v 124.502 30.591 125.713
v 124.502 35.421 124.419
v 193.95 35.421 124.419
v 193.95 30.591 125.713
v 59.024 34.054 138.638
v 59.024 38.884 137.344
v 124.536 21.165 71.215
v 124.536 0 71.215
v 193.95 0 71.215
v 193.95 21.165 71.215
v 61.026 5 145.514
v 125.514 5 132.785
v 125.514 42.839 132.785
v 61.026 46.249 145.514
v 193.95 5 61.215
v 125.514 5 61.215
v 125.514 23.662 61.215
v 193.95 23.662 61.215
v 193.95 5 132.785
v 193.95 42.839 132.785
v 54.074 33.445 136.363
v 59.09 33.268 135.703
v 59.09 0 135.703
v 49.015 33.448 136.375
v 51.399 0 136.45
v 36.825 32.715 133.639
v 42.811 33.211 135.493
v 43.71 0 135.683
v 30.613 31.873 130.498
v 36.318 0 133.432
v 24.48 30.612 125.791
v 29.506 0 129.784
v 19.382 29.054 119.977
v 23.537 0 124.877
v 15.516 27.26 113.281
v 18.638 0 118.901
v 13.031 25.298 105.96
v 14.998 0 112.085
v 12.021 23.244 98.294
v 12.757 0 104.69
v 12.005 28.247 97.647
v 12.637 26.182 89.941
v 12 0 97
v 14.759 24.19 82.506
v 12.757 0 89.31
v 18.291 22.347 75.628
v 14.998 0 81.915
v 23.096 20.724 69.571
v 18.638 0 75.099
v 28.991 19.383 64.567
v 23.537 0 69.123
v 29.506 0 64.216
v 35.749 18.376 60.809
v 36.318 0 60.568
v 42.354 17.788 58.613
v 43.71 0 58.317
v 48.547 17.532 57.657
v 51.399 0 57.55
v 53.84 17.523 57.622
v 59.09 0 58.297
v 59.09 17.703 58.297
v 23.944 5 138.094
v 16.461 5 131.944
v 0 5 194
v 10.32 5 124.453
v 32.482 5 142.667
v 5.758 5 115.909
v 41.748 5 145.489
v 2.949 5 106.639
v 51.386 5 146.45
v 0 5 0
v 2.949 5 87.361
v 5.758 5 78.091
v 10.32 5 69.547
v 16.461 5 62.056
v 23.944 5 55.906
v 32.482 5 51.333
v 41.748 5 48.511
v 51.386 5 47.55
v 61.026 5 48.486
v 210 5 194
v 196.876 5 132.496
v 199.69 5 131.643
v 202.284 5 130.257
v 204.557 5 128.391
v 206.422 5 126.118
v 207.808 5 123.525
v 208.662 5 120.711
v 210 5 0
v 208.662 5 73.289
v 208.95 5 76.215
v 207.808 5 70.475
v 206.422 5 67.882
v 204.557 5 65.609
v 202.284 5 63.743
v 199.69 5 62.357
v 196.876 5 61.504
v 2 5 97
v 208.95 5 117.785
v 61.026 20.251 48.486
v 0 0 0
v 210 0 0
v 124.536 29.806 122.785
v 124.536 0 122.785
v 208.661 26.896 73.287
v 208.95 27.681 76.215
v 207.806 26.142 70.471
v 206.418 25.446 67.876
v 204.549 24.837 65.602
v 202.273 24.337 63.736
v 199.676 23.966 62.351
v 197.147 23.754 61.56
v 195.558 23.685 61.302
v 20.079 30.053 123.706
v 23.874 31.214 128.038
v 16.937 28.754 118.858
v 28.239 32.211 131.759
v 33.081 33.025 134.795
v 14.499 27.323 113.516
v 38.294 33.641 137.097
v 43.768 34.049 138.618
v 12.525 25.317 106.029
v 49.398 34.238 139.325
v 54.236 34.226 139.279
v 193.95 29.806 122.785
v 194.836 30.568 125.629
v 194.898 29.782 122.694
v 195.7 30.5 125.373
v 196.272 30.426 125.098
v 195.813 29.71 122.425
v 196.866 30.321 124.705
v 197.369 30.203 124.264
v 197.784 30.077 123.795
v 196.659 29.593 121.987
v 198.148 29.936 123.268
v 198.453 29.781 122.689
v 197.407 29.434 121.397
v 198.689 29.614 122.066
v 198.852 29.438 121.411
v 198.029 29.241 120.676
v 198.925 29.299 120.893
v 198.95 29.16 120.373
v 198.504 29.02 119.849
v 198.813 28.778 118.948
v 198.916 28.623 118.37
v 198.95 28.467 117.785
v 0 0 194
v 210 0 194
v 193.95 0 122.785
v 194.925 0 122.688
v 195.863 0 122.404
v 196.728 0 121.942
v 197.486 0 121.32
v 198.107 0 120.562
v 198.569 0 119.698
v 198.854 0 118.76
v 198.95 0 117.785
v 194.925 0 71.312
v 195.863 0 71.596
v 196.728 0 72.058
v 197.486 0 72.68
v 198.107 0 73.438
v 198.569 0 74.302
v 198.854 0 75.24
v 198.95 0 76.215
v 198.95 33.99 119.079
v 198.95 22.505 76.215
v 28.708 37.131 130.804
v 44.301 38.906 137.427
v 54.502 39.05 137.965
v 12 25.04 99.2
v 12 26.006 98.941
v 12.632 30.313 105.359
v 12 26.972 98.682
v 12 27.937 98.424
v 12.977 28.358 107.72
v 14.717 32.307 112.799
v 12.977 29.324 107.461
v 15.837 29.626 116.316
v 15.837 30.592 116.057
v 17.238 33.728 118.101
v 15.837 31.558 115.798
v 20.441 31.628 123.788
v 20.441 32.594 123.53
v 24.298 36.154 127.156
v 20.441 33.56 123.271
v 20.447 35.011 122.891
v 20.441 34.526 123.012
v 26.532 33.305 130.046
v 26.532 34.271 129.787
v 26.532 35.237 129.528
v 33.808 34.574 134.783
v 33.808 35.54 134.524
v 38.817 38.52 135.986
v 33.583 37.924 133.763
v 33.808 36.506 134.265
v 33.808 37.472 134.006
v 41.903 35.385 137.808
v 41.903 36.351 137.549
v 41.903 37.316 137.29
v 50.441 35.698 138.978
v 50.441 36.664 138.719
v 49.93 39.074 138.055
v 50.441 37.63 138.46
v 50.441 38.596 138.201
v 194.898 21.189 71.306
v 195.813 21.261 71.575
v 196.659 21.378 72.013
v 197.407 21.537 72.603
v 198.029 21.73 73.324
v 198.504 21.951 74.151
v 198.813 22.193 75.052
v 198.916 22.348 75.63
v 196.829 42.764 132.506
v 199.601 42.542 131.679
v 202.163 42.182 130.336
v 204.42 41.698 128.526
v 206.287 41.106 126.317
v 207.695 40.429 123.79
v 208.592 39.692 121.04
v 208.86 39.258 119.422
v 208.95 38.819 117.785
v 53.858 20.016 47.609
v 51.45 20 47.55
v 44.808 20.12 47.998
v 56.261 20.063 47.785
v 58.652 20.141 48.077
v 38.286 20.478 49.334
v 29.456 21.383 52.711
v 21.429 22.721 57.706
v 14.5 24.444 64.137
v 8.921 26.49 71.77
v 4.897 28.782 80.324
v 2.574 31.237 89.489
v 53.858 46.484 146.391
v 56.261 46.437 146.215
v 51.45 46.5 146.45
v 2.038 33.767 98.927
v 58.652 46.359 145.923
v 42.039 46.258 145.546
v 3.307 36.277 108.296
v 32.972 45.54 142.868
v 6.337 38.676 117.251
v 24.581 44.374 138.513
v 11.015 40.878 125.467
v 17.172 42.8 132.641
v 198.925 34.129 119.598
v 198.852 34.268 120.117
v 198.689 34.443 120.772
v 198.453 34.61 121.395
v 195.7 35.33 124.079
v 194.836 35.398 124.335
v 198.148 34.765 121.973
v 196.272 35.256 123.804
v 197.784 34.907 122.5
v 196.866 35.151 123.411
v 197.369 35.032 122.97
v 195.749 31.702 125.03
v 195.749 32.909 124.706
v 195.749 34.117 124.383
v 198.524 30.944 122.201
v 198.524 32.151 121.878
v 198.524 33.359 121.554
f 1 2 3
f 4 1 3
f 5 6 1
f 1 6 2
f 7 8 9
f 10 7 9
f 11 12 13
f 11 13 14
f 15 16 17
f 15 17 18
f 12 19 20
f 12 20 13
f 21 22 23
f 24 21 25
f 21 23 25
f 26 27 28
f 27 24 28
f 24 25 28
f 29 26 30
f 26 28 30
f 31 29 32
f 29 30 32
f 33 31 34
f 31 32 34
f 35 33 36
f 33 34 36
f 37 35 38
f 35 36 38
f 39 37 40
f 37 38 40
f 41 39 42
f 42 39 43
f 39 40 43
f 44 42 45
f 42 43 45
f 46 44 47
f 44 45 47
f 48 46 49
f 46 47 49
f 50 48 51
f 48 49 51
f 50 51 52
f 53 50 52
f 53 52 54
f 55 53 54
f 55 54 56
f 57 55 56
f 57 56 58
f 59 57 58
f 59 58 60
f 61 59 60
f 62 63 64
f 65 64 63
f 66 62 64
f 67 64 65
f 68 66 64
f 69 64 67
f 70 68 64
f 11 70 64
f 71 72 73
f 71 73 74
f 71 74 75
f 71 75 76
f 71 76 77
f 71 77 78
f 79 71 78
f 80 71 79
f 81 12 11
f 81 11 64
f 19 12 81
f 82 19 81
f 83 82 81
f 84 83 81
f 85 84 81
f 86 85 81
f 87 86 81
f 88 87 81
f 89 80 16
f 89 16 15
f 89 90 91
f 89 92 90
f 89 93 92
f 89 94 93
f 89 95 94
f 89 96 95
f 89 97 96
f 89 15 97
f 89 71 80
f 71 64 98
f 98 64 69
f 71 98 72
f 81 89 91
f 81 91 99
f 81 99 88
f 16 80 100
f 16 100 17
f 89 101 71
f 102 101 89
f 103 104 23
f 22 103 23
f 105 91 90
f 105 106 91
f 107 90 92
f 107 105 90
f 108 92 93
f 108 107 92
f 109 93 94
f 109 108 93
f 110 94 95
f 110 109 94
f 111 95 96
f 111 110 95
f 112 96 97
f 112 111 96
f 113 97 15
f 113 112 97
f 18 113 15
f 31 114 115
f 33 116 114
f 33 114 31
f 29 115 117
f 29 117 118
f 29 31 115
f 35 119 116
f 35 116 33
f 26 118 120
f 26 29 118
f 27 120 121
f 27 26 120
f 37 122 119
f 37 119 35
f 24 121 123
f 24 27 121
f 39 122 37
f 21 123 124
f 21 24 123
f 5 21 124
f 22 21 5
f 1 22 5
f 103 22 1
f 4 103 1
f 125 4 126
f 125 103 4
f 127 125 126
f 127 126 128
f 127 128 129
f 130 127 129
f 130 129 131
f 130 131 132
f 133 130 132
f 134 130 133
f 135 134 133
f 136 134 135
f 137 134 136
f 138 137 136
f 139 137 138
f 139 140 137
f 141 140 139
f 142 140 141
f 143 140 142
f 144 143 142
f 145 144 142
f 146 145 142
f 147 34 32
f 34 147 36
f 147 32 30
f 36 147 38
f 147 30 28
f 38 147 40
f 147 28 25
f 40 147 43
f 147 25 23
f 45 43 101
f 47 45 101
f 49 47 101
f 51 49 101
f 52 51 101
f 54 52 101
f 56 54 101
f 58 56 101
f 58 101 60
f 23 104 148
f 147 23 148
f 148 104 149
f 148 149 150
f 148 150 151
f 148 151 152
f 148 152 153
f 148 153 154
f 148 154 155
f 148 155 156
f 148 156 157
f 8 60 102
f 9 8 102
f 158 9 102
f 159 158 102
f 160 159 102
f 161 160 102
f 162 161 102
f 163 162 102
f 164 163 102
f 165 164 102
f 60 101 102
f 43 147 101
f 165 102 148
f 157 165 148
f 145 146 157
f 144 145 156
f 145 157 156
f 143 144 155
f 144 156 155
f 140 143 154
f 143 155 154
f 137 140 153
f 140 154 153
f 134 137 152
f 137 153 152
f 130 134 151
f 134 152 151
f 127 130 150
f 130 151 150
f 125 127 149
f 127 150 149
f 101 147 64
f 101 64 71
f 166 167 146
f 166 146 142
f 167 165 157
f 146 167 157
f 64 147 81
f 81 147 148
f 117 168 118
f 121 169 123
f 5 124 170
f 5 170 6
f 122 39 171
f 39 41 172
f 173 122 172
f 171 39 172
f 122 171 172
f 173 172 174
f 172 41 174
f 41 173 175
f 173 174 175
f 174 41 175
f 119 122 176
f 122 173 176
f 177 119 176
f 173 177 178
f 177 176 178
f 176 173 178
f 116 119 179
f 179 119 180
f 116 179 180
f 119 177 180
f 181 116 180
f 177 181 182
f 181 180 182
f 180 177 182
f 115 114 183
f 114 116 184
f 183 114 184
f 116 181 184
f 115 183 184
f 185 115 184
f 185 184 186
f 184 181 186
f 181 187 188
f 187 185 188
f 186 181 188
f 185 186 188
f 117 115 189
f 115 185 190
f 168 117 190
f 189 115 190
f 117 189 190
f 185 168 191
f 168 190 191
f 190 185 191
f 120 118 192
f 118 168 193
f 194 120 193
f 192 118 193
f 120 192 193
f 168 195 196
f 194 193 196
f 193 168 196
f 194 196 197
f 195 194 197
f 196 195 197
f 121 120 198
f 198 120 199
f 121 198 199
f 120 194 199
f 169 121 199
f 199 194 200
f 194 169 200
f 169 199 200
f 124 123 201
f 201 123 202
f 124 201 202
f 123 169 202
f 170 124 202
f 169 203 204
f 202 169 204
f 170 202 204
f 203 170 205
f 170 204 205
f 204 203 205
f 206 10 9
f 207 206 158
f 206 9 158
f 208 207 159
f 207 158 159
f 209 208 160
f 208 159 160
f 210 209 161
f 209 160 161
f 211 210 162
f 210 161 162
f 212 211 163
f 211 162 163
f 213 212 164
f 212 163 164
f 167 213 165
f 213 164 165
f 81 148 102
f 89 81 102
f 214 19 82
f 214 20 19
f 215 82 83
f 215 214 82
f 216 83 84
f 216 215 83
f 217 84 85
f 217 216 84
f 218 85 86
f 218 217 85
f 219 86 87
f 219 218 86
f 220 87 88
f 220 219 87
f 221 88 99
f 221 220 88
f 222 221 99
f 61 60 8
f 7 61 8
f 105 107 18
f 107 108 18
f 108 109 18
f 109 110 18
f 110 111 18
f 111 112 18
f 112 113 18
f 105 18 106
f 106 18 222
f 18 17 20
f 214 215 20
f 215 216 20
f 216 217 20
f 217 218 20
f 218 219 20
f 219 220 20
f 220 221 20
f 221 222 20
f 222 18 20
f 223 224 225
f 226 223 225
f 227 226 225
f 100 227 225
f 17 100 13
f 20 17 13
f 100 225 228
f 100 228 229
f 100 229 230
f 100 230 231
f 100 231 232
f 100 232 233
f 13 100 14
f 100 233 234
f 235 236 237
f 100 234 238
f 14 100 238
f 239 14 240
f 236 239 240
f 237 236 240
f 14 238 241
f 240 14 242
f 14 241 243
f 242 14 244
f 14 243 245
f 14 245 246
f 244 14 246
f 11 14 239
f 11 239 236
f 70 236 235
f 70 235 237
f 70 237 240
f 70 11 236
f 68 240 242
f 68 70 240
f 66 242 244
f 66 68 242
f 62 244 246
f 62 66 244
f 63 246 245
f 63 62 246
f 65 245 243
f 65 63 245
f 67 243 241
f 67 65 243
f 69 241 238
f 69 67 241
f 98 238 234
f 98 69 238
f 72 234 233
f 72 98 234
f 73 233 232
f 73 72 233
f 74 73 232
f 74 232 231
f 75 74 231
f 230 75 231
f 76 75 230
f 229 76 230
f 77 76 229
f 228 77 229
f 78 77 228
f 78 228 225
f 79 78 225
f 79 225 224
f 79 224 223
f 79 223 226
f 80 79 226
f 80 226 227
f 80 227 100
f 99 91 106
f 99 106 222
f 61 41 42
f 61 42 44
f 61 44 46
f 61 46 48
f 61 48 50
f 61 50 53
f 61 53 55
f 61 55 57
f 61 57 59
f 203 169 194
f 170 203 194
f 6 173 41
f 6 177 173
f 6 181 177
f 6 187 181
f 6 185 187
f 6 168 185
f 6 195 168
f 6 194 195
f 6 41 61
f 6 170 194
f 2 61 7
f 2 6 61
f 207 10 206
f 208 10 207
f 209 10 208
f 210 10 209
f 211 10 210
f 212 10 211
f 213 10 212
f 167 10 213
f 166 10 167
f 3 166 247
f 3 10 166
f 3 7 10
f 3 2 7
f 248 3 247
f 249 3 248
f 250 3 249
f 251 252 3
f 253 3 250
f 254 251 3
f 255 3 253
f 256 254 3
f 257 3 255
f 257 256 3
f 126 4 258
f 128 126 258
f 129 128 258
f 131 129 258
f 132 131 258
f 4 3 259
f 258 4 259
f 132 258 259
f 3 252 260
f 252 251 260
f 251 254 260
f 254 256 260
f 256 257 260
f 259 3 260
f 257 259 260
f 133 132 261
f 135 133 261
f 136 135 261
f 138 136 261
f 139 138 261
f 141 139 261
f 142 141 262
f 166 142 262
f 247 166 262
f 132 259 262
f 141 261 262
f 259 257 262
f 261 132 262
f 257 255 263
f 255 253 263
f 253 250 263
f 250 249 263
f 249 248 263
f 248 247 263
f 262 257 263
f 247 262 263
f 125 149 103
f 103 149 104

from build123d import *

# Parameters (mm, degrees)
SKETCH_1_W          = 210
SKETCH_1_H          = 194
EXTRUDE_1_DEPTH     = 5
EXTRUDE_2_DEPTH     = 50
CUT_EXTRUDE_1_DEPTH = 292.137424595
FILLET_1_R          = 15
CUT_EXTRUDE_2_DEPTH = 15
CUT_EXTRUDE_4_DEPTH = 5
CUT_EXTRUDE_6_REACH = 289.625


with BuildPart() as part:
    # 草图1 → 凸台-拉伸1 (new body)
    with BuildSketch(Plane(origin=(0, 0, 0), x_dir=(1, 0, 0), z_dir=(0, 1, 0))):
        with Locations((105, -97)):
            Rectangle(SKETCH_1_W, SKETCH_1_H)
    extrude(amount=EXTRUDE_1_DEPTH)

    # 草图2 → 凸台-拉伸2 (add)
    with BuildSketch(Plane(origin=(0, 5, 0), x_dir=(1, 0, 0), z_dir=(0, 1, 0))):
        with BuildLine():
            Line((125.513628731, -61.215495335), (208.95, -61.215495335))
            Line((208.95, -61.215495335), (208.95, -132.784504665))
            Line((208.95, -132.784504665), (125.513628731, -132.784504665))
            Line((125.513628731, -132.784504665), (61.026324627, -145.513879526))
            ThreePointArc((61.026324627, -145.513879526), (2, -97), (61.026324627, -48.486120474))
            Line((61.026324627, -48.486120474), (125.513628731, -61.215495335))
        make_face()
    extrude(amount=EXTRUDE_2_DEPTH)

    # 草图3 → 切除-拉伸1 (cut, through all)
    with BuildSketch(Plane.ZY):
        Polygon((146.45, 46.500175131), (146.45, 55), (47.55, 55), (47.55, 20), align=None)
    extrude(amount=-CUT_EXTRUDE_1_DEPTH, mode=Mode.SUBTRACT)

    # 圆角1
    fillet_1_edges = [part.edges().sort_by_distance(p)[0] for p in [
        (208.95, 14.33082922, 61.215495335),
        (208.95, 23.919258346, 132.784504665),
    ]]
    fillet(fillet_1_edges, radius=FILLET_1_R)

    # 草图5 → 切除-拉伸2 (cut)
    with BuildSketch(Plane.XZ):
        with BuildLine():
            Line((124.536092452, 122.784504665), (59.089757463, 135.703185992))
            ThreePointArc((59.089757463, 135.703185992), (12, 97), (59.089757463, 58.296814008))
            Line((59.089757463, 58.296814008), (124.536092452, 71.215495335))
            Line((124.536092452, 71.215495335), (193.95, 71.215495335))
            ThreePointArc((193.95, 71.215495335), (197.485533906, 72.679961429), (198.95, 76.215495335))
            Line((198.95, 76.215495335), (198.95, 117.784504665))
            ThreePointArc((198.95, 117.784504665), (197.485533906, 121.320038571), (193.95, 122.784504665))
            Line((193.95, 122.784504665), (124.536092452, 122.784504665))
        make_face()
    extrude(amount=-CUT_EXTRUDE_2_DEPTH, mode=Mode.SUBTRACT)

    # 草图7 → 切除-拉伸4 (cut)
    with BuildSketch(Plane(origin=(0, 1.943124906, -0.520658749), x_dir=(1, 0, 0), z_dir=(0, 0.9659258262890681, -0.25881904510252174))):
        with BuildLine():
            Line((124.502295526, -129.347406371), (193.95, -129.347406371))
            add(Edge.make_bspline(
                [(193.95, -129.347406371), (194.562427767, -129.347406371), (195.774611757, -129.102068407), (197.439735395, -127.969946536), (198.650781168, -126.127504684), (198.95, -124.574413564), (198.95, -123.818263665)],
                knots=[-3.141592654, -3.141592654, -3.141592654, -3.141592654, -2.748893572, -2.35619449, -1.963495408, -1.570796327, -1.570796327, -1.570796327, -1.570796327], degree=3))
            Line((198.95, -123.818263665), (198.95, -80.782858462))
            add(Edge.make_bspline(
                [(198.95, -80.782858462), (198.95, -80.026708563), (198.650781168, -78.473617443), (197.439735395, -76.631175591), (195.774611757, -75.49905372), (194.562427767, -75.253715756), (193.95, -75.253715756)],
                knots=[-1.570796327, -1.570796327, -1.570796327, -1.570796327, -1.178097245, -0.785398163, -0.392699082, 0, 0, 0, 0], degree=3))
            Line((193.95, -75.253715756), (124.502295526, -75.253715756))
            Line((124.502295526, -75.253715756), (59.024136493, -61.872809237))
            add(Edge.make_bspline(
                [(59.024136493, -61.872809237), (56.210095744, -61.297740897), (50.427971911, -60.789688878), (38.964091843, -62.413259275), (25.731264842, -69.297623809), (14.654919531, -83.972220417), (10.672540234, -102.300561063), (14.654919531, -120.628901709), (25.731264842, -135.303498318), (38.964091843, -142.187862851), (50.427971911, -143.811433248), (56.210095744, -143.30338123), (59.024136493, -142.72831289)],
                knots=[-0.194888061, -0.194888061, -0.194888061, -0.194888061, 0.025822487, 0.246533036, 0.687954133, 1.12937523, 1.570796327, 2.012217424, 2.453638521, 2.895059618, 3.115770166, 3.336480715, 3.336480715, 3.336480715, 3.336480715], degree=3))
            Line((59.024136493, -142.72831289), (124.502295526, -129.347406371))
        make_face()
    extrude(amount=-CUT_EXTRUDE_4_DEPTH, mode=Mode.SUBTRACT)

    # 切除-拉伸6: up to this face of the body (flat: up to its plane)
    cut_extrude_6_end = Plane(part.part.faces().sort_by_distance((100.607454563, 28.420458434, 98.294095226))[0])
    # 草图8 → 切除-拉伸6 (cut, up to the picked face)
    with BuildSketch(Plane.XZ.offset(-15), mode=Mode.PRIVATE) as cut_extrude_6_sk1:
        with BuildLine():
            Line((193.95, 122.784504665), (124.536092452, 122.784504665))
            Line((124.536092452, 122.784504665), (59.089757463, 135.703185992))
            ThreePointArc((59.089757463, 135.703185992), (12, 97), (59.089757463, 58.296814008))
            Line((59.089757463, 58.296814008), (124.536092452, 71.215495335))
            Line((124.536092452, 71.215495335), (193.95, 71.215495335))
            ThreePointArc((193.95, 71.215495335), (197.485533906, 72.679961429), (198.95, 76.215495335))
            Line((198.95, 76.215495335), (198.95, 117.784504665))
            ThreePointArc((198.95, 117.784504665), (197.485533906, 121.320038571), (193.95, 122.784504665))
        make_face()
    cut_extrude_6_tool1 = split(extrude(cut_extrude_6_sk1.sketch, amount=-CUT_EXTRUDE_6_REACH, mode=Mode.PRIVATE), bisect_by=cut_extrude_6_end, keep=Keep.BOTH, mode=Mode.PRIVATE)
    add(cut_extrude_6_tool1.solids().sort_by(Axis((100.513282, 15, 97), (0, 1, 0)))[0], mode=Mode.SUBTRACT)


solid = part.part
